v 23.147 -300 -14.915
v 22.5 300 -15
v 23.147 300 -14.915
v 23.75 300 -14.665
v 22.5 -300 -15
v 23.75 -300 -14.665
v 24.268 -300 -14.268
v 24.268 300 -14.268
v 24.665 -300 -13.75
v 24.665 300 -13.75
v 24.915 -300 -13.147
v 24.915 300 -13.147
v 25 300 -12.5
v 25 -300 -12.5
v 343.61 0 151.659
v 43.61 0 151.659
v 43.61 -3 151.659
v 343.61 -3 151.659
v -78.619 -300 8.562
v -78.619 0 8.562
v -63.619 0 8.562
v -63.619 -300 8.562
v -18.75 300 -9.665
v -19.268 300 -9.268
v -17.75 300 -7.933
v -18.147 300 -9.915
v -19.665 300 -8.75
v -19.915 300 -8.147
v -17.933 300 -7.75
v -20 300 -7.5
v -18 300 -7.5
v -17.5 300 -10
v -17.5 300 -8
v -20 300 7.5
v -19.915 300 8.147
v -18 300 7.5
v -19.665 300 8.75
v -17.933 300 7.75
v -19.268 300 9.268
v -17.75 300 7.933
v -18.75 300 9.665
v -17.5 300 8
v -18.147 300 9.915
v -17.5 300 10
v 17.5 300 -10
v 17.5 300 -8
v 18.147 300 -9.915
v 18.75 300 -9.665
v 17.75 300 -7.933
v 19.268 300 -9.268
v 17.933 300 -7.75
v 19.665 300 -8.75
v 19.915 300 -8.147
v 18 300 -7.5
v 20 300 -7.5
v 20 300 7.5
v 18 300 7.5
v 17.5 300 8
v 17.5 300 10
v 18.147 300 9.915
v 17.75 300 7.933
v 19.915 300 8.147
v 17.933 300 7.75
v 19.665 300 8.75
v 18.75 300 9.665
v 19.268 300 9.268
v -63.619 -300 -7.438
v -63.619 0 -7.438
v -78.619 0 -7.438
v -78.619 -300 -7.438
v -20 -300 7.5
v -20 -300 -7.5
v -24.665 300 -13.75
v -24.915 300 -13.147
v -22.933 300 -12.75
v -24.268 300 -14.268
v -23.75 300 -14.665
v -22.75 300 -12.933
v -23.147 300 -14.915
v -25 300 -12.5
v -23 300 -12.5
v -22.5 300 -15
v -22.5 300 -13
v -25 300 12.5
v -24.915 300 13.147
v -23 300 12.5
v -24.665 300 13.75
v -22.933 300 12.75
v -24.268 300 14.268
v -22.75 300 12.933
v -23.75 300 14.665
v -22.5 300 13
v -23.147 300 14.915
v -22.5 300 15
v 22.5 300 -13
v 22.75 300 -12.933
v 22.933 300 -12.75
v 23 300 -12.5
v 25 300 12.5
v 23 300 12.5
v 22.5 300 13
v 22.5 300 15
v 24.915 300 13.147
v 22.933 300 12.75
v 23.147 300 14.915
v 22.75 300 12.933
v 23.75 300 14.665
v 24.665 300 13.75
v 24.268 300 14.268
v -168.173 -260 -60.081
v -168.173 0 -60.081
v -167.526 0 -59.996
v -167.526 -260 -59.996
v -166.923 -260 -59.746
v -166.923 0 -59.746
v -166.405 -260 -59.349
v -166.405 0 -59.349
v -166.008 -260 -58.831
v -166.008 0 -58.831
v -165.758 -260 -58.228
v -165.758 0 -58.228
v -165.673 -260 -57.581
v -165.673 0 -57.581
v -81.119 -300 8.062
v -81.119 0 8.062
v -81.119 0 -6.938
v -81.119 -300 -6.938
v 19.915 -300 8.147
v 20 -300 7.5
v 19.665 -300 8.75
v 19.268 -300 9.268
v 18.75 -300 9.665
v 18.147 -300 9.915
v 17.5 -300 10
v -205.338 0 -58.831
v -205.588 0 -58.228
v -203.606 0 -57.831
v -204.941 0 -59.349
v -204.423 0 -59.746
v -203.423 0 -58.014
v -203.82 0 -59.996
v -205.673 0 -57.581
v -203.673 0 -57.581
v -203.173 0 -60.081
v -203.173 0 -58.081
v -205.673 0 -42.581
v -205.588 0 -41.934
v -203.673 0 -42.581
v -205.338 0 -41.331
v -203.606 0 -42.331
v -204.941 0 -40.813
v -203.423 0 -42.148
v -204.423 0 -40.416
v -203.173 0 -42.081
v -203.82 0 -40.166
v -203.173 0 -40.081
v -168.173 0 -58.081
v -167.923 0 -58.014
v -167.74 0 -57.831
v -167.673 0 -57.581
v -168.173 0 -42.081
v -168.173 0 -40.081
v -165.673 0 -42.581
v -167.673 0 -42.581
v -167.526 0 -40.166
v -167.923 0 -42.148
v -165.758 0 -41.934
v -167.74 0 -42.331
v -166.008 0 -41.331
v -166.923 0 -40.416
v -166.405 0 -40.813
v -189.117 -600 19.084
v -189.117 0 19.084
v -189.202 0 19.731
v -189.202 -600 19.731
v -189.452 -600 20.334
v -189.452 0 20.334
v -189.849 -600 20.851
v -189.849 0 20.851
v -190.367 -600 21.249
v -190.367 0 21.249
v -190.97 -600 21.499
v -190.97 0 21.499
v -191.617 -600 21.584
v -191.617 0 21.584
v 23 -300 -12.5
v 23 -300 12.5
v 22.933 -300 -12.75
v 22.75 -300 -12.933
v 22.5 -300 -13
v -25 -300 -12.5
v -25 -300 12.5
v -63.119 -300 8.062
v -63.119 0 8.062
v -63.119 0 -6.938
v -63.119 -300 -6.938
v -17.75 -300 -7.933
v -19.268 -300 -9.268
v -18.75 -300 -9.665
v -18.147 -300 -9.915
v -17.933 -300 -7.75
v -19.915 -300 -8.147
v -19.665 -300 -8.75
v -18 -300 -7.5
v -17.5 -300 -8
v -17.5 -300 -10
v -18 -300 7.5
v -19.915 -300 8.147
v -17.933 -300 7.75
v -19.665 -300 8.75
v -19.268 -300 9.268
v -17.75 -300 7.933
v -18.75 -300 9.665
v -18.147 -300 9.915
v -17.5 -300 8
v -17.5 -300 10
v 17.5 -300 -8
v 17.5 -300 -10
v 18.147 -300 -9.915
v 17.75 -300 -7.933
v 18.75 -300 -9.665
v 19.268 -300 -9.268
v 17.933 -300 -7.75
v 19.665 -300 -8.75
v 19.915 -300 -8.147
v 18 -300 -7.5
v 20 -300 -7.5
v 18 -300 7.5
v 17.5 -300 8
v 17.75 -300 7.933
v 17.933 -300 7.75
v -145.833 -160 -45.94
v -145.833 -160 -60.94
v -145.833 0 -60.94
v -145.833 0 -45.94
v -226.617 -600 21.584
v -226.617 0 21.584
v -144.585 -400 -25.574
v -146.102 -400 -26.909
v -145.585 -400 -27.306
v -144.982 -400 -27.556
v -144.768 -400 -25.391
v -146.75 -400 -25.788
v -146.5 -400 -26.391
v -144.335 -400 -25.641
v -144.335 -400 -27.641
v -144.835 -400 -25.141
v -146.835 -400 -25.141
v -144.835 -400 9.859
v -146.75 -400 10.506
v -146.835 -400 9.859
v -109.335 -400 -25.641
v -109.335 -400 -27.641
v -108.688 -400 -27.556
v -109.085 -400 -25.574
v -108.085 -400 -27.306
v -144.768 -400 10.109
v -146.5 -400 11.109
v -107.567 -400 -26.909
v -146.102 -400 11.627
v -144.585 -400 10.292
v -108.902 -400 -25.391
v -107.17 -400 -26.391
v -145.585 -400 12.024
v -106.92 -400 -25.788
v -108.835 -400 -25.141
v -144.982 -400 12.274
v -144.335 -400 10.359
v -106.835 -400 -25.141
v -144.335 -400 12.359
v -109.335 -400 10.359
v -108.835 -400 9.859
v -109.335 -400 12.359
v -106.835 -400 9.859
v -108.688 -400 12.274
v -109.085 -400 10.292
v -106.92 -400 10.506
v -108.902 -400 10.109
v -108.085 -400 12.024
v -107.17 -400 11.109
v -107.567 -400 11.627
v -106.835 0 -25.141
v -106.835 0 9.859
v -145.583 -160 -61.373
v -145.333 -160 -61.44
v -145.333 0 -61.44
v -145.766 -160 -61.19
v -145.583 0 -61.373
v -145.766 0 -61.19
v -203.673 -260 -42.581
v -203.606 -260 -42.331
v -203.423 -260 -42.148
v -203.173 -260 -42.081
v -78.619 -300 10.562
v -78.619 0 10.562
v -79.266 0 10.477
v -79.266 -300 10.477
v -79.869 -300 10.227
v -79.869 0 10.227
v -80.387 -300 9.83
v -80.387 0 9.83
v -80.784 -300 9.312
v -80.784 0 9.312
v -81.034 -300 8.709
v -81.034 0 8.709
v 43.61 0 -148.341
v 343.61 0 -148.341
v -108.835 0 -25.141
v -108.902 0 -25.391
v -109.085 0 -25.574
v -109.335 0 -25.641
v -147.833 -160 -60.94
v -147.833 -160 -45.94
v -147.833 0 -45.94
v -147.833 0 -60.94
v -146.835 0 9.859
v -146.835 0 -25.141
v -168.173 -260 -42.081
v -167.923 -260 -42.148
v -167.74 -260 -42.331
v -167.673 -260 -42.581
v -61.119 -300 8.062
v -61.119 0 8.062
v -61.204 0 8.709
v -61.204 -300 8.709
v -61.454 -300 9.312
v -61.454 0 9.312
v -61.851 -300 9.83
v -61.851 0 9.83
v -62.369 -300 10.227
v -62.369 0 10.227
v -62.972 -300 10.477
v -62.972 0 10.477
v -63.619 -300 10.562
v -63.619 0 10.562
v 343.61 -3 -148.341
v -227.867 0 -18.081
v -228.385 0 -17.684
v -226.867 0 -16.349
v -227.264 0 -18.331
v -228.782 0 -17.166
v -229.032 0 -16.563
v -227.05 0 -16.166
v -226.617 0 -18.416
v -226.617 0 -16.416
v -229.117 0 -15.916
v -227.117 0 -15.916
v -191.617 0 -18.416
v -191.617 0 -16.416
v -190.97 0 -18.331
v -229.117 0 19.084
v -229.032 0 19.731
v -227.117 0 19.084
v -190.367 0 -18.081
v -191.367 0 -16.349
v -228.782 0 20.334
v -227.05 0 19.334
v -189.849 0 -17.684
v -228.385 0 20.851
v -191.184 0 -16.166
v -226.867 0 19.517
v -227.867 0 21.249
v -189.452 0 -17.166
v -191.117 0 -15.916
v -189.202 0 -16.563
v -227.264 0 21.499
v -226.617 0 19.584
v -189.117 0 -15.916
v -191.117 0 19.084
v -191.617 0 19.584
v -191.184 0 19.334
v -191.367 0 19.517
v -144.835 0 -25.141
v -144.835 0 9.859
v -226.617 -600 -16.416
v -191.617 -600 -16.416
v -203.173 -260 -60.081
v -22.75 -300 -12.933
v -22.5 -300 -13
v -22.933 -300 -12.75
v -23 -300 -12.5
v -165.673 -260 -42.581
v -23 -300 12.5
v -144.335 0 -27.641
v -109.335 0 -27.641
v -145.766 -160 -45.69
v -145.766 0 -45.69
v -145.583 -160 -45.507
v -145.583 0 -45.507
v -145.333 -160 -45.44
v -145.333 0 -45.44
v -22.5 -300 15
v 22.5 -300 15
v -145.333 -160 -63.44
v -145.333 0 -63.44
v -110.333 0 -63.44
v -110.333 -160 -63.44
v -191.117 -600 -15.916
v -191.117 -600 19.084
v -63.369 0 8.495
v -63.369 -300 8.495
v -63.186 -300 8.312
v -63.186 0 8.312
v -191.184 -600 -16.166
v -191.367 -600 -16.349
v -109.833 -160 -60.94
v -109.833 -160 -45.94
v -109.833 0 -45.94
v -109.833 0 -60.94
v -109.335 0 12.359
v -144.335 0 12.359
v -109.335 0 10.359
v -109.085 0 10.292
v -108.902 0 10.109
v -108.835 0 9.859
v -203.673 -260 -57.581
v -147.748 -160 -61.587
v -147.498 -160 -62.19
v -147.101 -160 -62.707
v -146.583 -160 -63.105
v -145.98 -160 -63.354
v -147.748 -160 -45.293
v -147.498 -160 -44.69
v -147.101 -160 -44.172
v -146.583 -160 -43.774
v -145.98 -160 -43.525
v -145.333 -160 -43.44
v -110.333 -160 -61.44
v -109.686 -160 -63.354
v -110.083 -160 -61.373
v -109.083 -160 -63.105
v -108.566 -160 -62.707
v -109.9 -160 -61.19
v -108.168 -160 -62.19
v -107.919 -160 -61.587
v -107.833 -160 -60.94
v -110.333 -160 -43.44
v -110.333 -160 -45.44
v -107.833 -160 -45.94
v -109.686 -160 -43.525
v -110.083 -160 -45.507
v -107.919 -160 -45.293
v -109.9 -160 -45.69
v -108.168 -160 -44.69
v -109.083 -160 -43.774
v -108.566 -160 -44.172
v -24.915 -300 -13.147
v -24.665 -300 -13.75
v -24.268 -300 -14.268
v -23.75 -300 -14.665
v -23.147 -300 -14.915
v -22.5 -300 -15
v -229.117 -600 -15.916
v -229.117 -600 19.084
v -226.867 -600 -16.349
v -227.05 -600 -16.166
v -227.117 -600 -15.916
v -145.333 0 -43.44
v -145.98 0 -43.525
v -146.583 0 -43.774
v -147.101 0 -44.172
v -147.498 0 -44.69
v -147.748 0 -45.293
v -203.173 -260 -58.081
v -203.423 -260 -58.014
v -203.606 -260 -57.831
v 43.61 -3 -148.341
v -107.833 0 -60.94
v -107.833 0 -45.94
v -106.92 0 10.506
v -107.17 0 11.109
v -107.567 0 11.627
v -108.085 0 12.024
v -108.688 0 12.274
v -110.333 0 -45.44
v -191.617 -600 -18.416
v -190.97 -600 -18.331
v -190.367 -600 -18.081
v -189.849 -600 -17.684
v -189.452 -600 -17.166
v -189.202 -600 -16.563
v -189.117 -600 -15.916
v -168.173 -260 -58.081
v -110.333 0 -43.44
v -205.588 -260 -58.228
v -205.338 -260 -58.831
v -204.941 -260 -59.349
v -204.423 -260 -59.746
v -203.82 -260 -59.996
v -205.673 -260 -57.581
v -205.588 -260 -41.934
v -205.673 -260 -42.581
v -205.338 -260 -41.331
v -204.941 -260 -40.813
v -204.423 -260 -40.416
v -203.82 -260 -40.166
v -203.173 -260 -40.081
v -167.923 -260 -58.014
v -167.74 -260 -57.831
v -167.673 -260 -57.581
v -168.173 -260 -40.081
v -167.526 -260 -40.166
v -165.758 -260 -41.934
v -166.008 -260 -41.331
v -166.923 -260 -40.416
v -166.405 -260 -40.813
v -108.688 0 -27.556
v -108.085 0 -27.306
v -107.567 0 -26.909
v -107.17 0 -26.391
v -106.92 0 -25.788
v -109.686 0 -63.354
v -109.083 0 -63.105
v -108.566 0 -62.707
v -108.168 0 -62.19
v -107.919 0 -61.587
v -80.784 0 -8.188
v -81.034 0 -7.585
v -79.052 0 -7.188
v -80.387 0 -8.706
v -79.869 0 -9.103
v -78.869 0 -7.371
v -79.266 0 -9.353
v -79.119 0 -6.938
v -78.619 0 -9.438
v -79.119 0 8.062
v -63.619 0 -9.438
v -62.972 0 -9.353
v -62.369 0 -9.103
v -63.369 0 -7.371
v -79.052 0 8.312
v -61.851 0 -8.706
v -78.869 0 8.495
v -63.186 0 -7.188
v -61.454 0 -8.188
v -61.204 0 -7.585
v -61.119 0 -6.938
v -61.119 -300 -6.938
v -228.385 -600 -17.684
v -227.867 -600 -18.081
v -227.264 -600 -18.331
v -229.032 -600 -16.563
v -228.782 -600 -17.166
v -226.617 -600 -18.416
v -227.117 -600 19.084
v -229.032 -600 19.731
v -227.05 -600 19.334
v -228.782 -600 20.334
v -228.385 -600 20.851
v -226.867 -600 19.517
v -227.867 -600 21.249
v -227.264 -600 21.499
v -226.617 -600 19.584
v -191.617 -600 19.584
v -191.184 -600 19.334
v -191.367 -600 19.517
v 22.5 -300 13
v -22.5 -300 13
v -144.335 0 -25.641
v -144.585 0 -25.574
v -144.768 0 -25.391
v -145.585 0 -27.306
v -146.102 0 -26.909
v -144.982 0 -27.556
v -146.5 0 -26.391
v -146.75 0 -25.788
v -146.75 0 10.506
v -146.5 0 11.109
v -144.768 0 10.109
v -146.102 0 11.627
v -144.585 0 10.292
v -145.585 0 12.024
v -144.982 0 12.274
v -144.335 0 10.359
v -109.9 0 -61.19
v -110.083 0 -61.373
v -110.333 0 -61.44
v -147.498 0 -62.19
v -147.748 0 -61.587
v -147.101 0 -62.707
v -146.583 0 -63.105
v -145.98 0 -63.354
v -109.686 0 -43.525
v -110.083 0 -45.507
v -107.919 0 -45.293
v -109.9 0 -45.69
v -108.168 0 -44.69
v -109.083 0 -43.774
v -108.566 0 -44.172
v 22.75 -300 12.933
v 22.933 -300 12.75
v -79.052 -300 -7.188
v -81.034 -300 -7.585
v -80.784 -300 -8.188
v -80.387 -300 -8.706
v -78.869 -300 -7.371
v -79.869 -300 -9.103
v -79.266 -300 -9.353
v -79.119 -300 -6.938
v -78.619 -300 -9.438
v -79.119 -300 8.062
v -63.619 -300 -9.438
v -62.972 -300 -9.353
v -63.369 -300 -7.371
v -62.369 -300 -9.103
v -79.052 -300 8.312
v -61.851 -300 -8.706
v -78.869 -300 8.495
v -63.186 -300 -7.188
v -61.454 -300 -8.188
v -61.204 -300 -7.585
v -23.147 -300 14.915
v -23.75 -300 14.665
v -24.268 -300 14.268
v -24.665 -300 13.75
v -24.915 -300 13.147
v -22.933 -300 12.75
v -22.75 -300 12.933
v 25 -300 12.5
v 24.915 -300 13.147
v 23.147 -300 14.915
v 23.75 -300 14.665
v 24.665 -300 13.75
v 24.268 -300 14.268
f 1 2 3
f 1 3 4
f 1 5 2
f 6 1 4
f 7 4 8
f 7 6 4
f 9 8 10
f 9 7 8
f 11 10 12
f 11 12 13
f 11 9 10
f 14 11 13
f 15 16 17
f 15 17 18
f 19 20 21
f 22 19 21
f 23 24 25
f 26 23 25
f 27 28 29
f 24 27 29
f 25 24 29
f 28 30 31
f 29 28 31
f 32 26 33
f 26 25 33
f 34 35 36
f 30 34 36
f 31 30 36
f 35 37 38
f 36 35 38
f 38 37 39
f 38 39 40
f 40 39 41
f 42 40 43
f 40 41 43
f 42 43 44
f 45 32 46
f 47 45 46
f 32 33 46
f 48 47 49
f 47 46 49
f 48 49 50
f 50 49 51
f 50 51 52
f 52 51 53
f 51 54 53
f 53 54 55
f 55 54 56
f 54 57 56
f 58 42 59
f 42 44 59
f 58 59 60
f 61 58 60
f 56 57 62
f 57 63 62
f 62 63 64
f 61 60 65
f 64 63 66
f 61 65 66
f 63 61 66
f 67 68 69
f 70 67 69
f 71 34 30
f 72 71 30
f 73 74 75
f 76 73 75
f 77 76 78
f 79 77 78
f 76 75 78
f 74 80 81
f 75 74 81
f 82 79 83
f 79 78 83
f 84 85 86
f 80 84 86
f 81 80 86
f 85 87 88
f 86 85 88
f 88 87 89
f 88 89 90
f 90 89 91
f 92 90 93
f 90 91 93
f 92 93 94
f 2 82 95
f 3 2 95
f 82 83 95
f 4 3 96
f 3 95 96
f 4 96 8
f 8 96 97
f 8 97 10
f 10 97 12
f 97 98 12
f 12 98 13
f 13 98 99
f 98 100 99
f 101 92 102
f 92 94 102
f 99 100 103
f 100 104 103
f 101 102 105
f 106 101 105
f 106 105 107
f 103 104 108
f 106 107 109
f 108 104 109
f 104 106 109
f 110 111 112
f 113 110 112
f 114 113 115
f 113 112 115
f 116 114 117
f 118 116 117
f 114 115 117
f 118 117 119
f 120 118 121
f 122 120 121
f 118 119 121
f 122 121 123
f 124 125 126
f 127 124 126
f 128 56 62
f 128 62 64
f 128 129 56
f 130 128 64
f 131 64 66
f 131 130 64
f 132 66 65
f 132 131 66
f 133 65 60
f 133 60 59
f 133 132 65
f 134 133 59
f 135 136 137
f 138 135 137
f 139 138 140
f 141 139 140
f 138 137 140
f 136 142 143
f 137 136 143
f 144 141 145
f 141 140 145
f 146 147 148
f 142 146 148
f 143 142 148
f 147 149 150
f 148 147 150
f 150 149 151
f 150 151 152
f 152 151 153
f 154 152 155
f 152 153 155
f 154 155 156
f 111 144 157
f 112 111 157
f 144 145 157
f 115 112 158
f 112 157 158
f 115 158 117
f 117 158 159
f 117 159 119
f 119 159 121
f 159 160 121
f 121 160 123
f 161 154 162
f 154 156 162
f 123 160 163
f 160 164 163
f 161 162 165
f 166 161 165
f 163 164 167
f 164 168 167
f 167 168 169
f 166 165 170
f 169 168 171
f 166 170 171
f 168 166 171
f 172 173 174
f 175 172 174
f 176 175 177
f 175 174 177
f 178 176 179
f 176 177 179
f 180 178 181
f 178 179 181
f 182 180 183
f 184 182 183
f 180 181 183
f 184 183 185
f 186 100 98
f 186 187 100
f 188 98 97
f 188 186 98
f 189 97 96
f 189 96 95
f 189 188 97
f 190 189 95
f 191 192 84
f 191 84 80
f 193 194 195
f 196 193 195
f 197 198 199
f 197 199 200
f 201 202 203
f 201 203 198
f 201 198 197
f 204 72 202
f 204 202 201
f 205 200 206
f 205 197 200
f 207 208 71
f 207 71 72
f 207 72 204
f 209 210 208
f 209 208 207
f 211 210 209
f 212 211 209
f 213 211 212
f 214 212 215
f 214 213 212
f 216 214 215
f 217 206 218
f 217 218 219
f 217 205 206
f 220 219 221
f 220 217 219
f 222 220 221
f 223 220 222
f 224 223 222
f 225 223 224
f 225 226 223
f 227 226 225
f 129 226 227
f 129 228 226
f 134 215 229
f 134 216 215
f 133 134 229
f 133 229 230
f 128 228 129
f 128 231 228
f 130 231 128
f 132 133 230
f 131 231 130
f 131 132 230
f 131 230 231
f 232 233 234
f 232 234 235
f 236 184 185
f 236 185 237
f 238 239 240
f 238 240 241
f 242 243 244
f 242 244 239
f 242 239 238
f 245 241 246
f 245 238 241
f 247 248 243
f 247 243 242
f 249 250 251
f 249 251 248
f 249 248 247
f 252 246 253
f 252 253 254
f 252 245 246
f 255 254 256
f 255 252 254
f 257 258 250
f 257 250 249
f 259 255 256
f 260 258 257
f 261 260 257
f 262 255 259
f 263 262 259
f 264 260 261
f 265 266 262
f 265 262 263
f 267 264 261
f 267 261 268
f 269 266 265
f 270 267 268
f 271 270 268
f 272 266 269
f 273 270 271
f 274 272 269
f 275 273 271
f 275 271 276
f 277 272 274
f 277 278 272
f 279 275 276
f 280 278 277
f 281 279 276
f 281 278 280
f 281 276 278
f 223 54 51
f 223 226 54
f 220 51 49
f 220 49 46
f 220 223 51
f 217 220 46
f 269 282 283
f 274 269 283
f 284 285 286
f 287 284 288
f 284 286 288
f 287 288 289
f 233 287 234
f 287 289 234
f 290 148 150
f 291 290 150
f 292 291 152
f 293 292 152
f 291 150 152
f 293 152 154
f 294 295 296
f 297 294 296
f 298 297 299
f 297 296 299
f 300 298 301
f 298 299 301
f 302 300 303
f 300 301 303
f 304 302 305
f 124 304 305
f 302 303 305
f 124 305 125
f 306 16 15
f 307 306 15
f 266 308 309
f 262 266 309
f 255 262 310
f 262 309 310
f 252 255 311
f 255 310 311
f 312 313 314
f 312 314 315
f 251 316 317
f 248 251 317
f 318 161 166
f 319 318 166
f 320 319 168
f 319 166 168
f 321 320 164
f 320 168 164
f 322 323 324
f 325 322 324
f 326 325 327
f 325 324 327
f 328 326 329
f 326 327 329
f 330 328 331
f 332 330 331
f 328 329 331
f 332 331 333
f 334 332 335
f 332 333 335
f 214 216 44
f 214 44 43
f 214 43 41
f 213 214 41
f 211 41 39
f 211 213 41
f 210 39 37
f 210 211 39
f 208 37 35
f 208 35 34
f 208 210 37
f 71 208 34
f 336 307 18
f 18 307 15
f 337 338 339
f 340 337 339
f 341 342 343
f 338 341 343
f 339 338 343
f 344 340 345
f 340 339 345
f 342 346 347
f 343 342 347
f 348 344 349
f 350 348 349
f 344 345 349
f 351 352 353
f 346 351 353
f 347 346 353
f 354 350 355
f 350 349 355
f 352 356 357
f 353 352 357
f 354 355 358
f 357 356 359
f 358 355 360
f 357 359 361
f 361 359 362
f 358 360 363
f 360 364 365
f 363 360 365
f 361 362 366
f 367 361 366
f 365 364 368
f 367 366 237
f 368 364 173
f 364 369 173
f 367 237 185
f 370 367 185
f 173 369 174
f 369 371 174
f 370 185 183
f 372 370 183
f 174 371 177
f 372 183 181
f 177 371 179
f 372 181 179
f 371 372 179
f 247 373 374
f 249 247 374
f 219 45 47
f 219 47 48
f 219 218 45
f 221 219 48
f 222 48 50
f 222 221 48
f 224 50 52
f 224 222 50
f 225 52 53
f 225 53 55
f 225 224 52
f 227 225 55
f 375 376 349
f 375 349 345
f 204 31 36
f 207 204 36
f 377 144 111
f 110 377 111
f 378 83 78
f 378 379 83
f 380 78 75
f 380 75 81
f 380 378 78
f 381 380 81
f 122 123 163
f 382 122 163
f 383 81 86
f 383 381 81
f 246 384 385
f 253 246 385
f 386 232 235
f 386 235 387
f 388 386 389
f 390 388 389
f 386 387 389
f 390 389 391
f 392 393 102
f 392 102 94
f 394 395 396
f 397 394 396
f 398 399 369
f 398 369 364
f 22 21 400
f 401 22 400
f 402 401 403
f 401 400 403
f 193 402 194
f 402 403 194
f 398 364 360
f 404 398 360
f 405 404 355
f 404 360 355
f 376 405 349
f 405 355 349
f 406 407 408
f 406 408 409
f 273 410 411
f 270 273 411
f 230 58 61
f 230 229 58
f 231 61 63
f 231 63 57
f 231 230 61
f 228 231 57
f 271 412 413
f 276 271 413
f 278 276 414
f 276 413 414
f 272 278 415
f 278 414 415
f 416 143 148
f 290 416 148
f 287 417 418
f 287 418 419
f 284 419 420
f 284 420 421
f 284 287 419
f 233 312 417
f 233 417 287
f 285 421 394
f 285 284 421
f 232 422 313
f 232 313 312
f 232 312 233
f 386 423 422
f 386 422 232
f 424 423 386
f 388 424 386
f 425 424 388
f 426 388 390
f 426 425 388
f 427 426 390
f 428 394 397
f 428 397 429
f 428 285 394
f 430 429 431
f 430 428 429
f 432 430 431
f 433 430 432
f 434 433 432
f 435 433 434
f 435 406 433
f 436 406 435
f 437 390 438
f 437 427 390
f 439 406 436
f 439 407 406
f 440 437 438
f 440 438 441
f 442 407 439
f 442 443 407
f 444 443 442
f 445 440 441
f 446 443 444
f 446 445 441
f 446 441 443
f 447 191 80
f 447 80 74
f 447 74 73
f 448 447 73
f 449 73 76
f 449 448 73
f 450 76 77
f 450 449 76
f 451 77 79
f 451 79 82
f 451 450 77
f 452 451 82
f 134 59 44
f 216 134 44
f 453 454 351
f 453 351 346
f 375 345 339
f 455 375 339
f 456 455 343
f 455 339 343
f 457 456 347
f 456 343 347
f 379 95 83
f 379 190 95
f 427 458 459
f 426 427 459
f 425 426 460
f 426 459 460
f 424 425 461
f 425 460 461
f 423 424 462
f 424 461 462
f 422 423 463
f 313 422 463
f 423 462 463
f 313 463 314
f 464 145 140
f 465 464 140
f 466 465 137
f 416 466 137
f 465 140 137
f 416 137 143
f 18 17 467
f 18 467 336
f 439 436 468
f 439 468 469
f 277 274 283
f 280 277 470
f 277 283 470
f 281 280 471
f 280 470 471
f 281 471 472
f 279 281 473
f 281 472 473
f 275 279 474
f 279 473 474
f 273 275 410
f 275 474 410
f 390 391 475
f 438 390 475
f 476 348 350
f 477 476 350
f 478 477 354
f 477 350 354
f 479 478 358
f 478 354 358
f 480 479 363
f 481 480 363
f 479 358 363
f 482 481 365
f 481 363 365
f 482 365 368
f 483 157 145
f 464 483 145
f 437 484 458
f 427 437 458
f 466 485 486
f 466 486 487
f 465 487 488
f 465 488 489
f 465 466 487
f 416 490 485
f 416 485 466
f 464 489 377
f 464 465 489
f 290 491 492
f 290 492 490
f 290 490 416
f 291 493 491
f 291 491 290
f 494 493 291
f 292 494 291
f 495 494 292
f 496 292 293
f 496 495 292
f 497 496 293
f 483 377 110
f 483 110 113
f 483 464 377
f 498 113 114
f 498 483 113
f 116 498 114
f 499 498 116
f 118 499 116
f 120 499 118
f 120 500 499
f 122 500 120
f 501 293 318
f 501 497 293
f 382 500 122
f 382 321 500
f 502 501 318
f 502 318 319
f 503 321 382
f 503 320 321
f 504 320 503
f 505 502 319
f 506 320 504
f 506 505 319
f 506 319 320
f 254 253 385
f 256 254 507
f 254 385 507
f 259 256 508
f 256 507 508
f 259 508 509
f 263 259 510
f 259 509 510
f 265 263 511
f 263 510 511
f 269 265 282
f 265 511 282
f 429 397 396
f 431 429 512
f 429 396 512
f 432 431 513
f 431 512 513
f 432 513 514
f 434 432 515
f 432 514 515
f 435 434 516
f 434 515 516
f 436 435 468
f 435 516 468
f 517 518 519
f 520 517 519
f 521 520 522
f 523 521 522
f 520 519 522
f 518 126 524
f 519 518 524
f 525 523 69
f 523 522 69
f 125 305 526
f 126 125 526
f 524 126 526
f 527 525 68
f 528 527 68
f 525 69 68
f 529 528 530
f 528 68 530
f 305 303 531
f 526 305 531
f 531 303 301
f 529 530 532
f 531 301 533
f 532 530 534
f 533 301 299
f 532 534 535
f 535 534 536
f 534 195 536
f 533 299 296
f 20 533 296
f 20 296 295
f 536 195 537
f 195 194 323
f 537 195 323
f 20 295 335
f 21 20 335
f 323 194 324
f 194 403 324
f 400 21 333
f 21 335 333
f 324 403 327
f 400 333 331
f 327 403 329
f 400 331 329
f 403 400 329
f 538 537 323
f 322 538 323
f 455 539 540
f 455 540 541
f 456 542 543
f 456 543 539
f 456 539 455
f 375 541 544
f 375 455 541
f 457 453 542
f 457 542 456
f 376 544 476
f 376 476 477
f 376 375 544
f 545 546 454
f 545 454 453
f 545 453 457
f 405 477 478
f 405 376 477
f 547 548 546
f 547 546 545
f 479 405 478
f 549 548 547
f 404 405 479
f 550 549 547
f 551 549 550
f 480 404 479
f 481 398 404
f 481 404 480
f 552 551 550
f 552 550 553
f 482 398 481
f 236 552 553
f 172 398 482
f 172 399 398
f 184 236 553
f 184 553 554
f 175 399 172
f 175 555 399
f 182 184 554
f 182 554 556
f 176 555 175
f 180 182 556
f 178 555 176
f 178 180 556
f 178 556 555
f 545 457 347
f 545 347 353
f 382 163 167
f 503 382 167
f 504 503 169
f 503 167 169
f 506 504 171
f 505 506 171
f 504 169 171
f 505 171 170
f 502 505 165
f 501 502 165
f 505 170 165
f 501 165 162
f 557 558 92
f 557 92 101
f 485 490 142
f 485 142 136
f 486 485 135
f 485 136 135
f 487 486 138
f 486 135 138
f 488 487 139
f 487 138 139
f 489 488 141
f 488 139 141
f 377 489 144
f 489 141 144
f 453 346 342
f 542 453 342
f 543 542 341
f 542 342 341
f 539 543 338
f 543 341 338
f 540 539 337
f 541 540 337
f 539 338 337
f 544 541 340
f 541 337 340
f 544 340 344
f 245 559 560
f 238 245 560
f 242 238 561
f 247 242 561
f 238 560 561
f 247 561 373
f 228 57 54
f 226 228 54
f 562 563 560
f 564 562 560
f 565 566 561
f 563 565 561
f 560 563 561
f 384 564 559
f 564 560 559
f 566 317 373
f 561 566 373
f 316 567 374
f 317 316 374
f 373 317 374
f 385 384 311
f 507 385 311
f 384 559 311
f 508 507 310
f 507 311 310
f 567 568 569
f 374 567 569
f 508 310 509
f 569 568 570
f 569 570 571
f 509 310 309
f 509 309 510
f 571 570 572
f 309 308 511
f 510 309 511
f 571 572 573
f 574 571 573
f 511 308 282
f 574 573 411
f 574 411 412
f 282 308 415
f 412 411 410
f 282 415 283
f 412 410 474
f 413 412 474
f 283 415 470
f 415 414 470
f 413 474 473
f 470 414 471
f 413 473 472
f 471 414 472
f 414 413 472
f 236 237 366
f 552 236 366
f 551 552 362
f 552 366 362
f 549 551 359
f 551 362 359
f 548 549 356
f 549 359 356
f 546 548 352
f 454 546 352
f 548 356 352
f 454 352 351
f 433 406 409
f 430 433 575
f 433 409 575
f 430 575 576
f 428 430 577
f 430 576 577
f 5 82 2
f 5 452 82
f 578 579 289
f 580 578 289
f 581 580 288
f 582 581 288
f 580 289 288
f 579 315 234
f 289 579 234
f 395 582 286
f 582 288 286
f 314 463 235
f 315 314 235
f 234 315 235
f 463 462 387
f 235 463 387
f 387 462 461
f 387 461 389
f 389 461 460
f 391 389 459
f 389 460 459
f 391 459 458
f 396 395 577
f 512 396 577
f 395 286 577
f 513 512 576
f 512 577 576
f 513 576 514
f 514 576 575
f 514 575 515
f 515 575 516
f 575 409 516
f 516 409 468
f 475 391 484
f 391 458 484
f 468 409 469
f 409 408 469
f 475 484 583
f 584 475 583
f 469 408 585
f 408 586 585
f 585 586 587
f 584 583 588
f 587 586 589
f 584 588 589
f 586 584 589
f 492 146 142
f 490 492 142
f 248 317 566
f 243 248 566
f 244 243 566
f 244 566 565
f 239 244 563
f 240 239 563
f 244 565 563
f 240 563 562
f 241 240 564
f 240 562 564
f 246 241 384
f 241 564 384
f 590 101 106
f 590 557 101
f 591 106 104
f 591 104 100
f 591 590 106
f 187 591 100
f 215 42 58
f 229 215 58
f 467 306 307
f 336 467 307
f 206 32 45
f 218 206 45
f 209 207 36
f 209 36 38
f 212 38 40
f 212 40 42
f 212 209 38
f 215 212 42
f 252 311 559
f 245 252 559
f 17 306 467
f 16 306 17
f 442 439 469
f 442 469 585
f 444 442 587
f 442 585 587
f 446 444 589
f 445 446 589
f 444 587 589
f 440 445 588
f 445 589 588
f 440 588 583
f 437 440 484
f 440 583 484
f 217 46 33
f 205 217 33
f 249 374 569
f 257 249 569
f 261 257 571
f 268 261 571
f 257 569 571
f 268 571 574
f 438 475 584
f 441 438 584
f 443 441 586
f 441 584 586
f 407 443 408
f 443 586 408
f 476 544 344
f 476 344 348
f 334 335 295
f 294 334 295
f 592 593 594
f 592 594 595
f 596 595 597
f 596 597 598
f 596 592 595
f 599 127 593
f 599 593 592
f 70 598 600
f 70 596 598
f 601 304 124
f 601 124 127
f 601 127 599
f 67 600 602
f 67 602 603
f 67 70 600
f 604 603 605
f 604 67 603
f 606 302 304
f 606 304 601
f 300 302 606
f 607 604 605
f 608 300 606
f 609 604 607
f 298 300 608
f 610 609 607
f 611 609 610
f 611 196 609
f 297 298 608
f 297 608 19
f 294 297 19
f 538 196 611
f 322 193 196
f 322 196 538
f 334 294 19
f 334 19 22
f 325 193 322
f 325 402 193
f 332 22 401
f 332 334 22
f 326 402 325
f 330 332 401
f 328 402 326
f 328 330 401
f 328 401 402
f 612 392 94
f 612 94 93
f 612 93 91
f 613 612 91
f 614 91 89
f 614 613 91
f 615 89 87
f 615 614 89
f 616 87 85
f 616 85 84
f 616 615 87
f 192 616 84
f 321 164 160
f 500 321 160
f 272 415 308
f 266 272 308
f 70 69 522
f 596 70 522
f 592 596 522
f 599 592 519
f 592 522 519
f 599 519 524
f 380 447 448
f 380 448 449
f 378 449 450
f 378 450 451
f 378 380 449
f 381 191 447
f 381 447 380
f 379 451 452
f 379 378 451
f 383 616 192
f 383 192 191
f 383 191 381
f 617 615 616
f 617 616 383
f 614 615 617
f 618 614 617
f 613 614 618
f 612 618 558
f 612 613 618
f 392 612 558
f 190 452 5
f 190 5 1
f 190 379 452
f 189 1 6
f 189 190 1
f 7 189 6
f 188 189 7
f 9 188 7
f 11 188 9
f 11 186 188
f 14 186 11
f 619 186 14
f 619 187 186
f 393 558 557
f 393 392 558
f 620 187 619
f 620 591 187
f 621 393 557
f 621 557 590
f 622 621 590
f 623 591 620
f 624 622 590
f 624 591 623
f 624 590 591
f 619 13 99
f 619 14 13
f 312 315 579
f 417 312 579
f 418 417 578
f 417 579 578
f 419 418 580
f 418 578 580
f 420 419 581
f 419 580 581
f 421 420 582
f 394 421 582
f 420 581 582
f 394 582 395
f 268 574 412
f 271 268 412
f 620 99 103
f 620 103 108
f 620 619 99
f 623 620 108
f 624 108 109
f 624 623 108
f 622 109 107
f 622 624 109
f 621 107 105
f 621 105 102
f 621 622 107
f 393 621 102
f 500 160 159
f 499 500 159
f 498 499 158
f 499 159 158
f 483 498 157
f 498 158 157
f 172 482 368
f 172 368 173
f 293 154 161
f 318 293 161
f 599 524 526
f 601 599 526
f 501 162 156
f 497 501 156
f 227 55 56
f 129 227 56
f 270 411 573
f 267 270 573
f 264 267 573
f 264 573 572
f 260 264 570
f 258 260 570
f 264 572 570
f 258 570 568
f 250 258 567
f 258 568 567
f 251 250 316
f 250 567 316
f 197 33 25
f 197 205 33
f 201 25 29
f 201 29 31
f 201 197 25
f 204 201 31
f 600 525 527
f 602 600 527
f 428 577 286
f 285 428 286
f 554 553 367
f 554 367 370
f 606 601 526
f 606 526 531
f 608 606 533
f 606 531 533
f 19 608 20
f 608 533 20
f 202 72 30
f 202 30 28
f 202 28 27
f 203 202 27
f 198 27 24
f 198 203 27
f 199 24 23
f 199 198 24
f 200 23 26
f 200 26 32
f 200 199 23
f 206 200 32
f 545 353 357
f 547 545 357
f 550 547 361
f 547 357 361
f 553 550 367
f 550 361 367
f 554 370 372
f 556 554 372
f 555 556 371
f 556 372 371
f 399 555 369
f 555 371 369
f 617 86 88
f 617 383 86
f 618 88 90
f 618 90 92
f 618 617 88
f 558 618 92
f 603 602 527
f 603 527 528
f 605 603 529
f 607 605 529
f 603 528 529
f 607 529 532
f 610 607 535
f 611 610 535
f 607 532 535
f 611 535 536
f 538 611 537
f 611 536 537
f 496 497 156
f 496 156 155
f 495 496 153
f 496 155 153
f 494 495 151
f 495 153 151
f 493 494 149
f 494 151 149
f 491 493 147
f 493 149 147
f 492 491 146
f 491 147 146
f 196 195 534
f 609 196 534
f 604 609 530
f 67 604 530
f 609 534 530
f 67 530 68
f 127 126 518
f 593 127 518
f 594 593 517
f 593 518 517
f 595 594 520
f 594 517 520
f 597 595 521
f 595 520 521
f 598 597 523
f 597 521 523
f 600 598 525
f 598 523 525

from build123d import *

# Parameters (mm, degrees)
F1_DEPTH  = 300
F3_DEPTH  = 300
F6_DEPTH  = 300
F8_DEPTH  = 160
F9_W      = 300
F9_H      = 300
F10_DEPTH = 3
F12_DEPTH = 260
F14_DEPTH = 600
F15_DEPTH = 400


with BuildPart() as f1:
    # F0 (on Front) → F1 (new body, symmetric)
    with BuildSketch(Plane.XZ):
        with BuildLine():
            ThreePointArc((25, 12.5), (24.267767, 14.267767), (22.5, 15))
            Line((22.5, 15), (-22.5, 15))
            ThreePointArc((-22.5, 15), (-24.267767, 14.267767), (-25, 12.5))
            Line((-25, 12.5), (-25, -12.5))
            ThreePointArc((-25, -12.5), (-24.267767, -14.267767), (-22.5, -15))
            Line((-22.5, -15), (22.5, -15))
            ThreePointArc((22.5, -15), (24.267767, -14.267767), (25, -12.5))
            Line((25, -12.5), (25, 12.5))
        make_face()
        with BuildLine():
            Line((-22.5, 13), (22.5, 13))
            ThreePointArc((22.5, 13), (22.853553, 12.853553), (23, 12.5))
            Line((23, 12.5), (23, -12.5))
            ThreePointArc((23, -12.5), (22.853553, -12.853553), (22.5, -13))
            Line((22.5, -13), (-22.5, -13))
            ThreePointArc((-22.5, -13), (-22.853553, -12.853553), (-23, -12.5))
            Line((-23, -12.5), (-23, 12.5))
            ThreePointArc((-23, 12.5), (-22.853553, 12.853553), (-22.5, 13))
        make_face(mode=Mode.SUBTRACT)
    extrude(amount=F1_DEPTH, both=True)


with BuildPart() as f3:
    # F2 (on Front) → F3 (new body, symmetric)
    with BuildSketch(Plane.XZ):
        with BuildLine():
            Line((17.5, 10), (-17.5, 10))
            ThreePointArc((-17.5, 10), (-19.267767, 9.267767), (-20, 7.5))
            Line((-20, 7.5), (-20, -7.5))
            ThreePointArc((-20, -7.5), (-19.267767, -9.267767), (-17.5, -10))
            Line((-17.5, -10), (17.5, -10))
            ThreePointArc((17.5, -10), (19.267767, -9.267767), (20, -7.5))
            Line((20, -7.5), (20, 7.5))
            ThreePointArc((20, 7.5), (19.267767, 9.267767), (17.5, 10))
        make_face()
        with BuildLine():
            ThreePointArc((-18, 7.5), (-17.853553, 7.853553), (-17.5, 8))
            Line((-17.5, 8), (17.5, 8))
            ThreePointArc((17.5, 8), (17.853553, 7.853553), (18, 7.5))
            Line((18, 7.5), (18, -7.5))
            ThreePointArc((18, -7.5), (17.853553, -7.853553), (17.5, -8))
            Line((17.5, -8), (-17.5, -8))
            ThreePointArc((-17.5, -8), (-17.853553, -7.853553), (-18, -7.5))
            Line((-18, -7.5), (-18, 7.5))
        make_face(mode=Mode.SUBTRACT)
    extrude(amount=F3_DEPTH, both=True)


with BuildPart() as f6:
    # F5 (on Front) → F6 (new body)
    with BuildSketch(Plane.XZ):
        with BuildLine():
            Line((-63.618955, 10.562212), (-78.618955, 10.562212))
            ThreePointArc((-78.618955, 10.562212), (-80.386722, 9.829979), (-81.118955, 8.062212))
            Line((-81.118955, 8.062212), (-81.118955, -6.937788))
            ThreePointArc((-81.118955, -6.937788), (-80.386722, -8.705555), (-78.618955, -9.437788))
            Line((-78.618955, -9.437788), (-63.618955, -9.437788))
            ThreePointArc((-63.618955, -9.437788), (-61.851188, -8.705555), (-61.118955, -6.937788))
            Line((-61.118955, -6.937788), (-61.118955, 8.062212))
            ThreePointArc((-61.118955, 8.062212), (-61.851188, 9.829979), (-63.618955, 10.562212))
        make_face()
        with BuildLine():
            ThreePointArc((-79.118955, 8.062212), (-78.972508, 8.415765), (-78.618955, 8.562212))
            Line((-78.618955, 8.562212), (-63.618955, 8.562212))
            ThreePointArc((-63.618955, 8.562212), (-63.265401, 8.415765), (-63.118955, 8.062212))
            Line((-63.118955, 8.062212), (-63.118955, -6.937788))
            ThreePointArc((-63.118955, -6.937788), (-63.265401, -7.291342), (-63.618955, -7.437788))
            Line((-63.618955, -7.437788), (-78.618955, -7.437788))
            ThreePointArc((-78.618955, -7.437788), (-78.972508, -7.291342), (-79.118955, -6.937788))
            Line((-79.118955, -6.937788), (-79.118955, 8.062212))
        make_face(mode=Mode.SUBTRACT)
    extrude(amount=F6_DEPTH)


with BuildPart() as f8:
    # F7 (on Front) → F8 (new body)
    with BuildSketch(Plane.XZ):
        with BuildLine():
            Line((-110.333331, -43.439553), (-145.333331, -43.439553))
            ThreePointArc((-145.333331, -43.439553), (-147.101098, -44.171786), (-147.833331, -45.939553))
            Line((-147.833331, -45.939553), (-147.833331, -60.939553))
            ThreePointArc((-147.833331, -60.939553), (-147.101098, -62.70732), (-145.333331, -63.439553))
            Line((-145.333331, -63.439553), (-110.333331, -63.439553))
            ThreePointArc((-110.333331, -63.439553), (-108.565564, -62.70732), (-107.833331, -60.939553))
            Line((-107.833331, -60.939553), (-107.833331, -45.939553))
            ThreePointArc((-107.833331, -45.939553), (-108.565564, -44.171786), (-110.333331, -43.439553))
        make_face()
        with BuildLine():
            ThreePointArc((-145.833331, -45.939553), (-145.686884, -45.586), (-145.333331, -45.439553))
            Line((-145.333331, -45.439553), (-110.333331, -45.439553))
            ThreePointArc((-110.333331, -45.439553), (-109.979778, -45.586), (-109.833331, -45.939553))
            Line((-109.833331, -45.939553), (-109.833331, -60.939553))
            ThreePointArc((-109.833331, -60.939553), (-109.979778, -61.293106), (-110.333331, -61.439553))
            Line((-110.333331, -61.439553), (-145.333331, -61.439553))
            ThreePointArc((-145.333331, -61.439553), (-145.686884, -61.293106), (-145.833331, -60.939553))
            Line((-145.833331, -60.939553), (-145.833331, -45.939553))
        make_face(mode=Mode.SUBTRACT)
    extrude(amount=F8_DEPTH)


with BuildPart() as f10:
    # F9 (on Front) → F10 (new body)
    with BuildSketch(Plane.XZ):
        with Locations((193.61024, 1.659309)):
            Rectangle(F9_W, F9_H)
    extrude(amount=F10_DEPTH)


with BuildPart() as f12:
    # F11 (on Front) → F12 (new body)
    with BuildSketch(Plane.XZ):
        with BuildLine():
            Line((-168.173266, -40.080923), (-203.173266, -40.080923))
            ThreePointArc((-203.173266, -40.080923), (-204.941033, -40.813156), (-205.673266, -42.580923))
            Line((-205.673266, -42.580923), (-205.673266, -57.580923))
            ThreePointArc((-205.673266, -57.580923), (-204.941033, -59.34869), (-203.173266, -60.080923))
            Line((-203.173266, -60.080923), (-168.173266, -60.080923))
            ThreePointArc((-168.173266, -60.080923), (-166.405499, -59.34869), (-165.673266, -57.580923))
            Line((-165.673266, -57.580923), (-165.673266, -42.580923))
            ThreePointArc((-165.673266, -42.580923), (-166.405499, -40.813156), (-168.173266, -40.080923))
        make_face()
        with BuildLine():
            ThreePointArc((-203.673266, -42.580923), (-203.526819, -42.22737), (-203.173266, -42.080923))
            Line((-203.173266, -42.080923), (-168.173266, -42.080923))
            ThreePointArc((-168.173266, -42.080923), (-167.819712, -42.22737), (-167.673266, -42.580923))
            Line((-167.673266, -42.580923), (-167.673266, -57.580923))
            ThreePointArc((-167.673266, -57.580923), (-167.819712, -57.934476), (-168.173266, -58.080923))
            Line((-168.173266, -58.080923), (-203.173266, -58.080923))
            ThreePointArc((-203.173266, -58.080923), (-203.526819, -57.934476), (-203.673266, -57.580923))
            Line((-203.673266, -57.580923), (-203.673266, -42.580923))
        make_face(mode=Mode.SUBTRACT)
    extrude(amount=F12_DEPTH)


with BuildPart() as f14:
    # F13 (on Front) → F14 (new body)
    with BuildSketch(Plane.XZ):
        with BuildLine():
            Line((-191.616746, 21.583727), (-226.616746, 21.583727))
            ThreePointArc((-226.616746, 21.583727), (-228.384513, 20.851494), (-229.116746, 19.083727))
            Line((-229.116746, 19.083727), (-229.116746, -15.916273))
            ThreePointArc((-229.116746, -15.916273), (-228.384513, -17.68404), (-226.616746, -18.416273))
            Line((-226.616746, -18.416273), (-191.616746, -18.416273))
            ThreePointArc((-191.616746, -18.416273), (-189.848979, -17.68404), (-189.116746, -15.916273))
            Line((-189.116746, -15.916273), (-189.116746, 19.083727))
            ThreePointArc((-189.116746, 19.083727), (-189.848979, 20.851494), (-191.616746, 21.583727))
        make_face()
        with BuildLine():
            ThreePointArc((-227.116746, 19.083727), (-226.9703, 19.43728), (-226.616746, 19.583727))
            Line((-226.616746, 19.583727), (-191.616746, 19.583727))
            ThreePointArc((-191.616746, 19.583727), (-191.263193, 19.43728), (-191.116746, 19.083727))
            Line((-191.116746, 19.083727), (-191.116746, -15.916273))
            ThreePointArc((-191.116746, -15.916273), (-191.263193, -16.269827), (-191.616746, -16.416273))
            Line((-191.616746, -16.416273), (-226.616746, -16.416273))
            ThreePointArc((-226.616746, -16.416273), (-226.9703, -16.269827), (-227.116746, -15.916273))
            Line((-227.116746, -15.916273), (-227.116746, 19.083727))
        make_face(mode=Mode.SUBTRACT)
    extrude(amount=F14_DEPTH)


with BuildPart() as f15:
    # F4 (on Front) → F15 (new body)
    with BuildSketch(Plane.XZ):
        with BuildLine():
            Line((-109.334691, 12.358871), (-144.334691, 12.358871))
            ThreePointArc((-144.334691, 12.358871), (-146.102458, 11.626638), (-146.834691, 9.858871))
            Line((-146.834691, 9.858871), (-146.834691, -25.141129))
            ThreePointArc((-146.834691, -25.141129), (-146.102458, -26.908896), (-144.334691, -27.641129))
            Line((-144.334691, -27.641129), (-109.334691, -27.641129))
            ThreePointArc((-109.334691, -27.641129), (-107.566924, -26.908896), (-106.834691, -25.141129))
            Line((-106.834691, -25.141129), (-106.834691, 9.858871))
            ThreePointArc((-106.834691, 9.858871), (-107.566924, 11.626638), (-109.334691, 12.358871))
        make_face()
        with BuildLine():
            ThreePointArc((-144.834691, 9.858871), (-144.688244, 10.212424), (-144.334691, 10.358871))
            Line((-144.334691, 10.358871), (-109.334691, 10.358871))
            ThreePointArc((-109.334691, 10.358871), (-108.981137, 10.212424), (-108.834691, 9.858871))
            Line((-108.834691, 9.858871), (-108.834691, -25.141129))
            ThreePointArc((-108.834691, -25.141129), (-108.981137, -25.494682), (-109.334691, -25.641129))
            Line((-109.334691, -25.641129), (-144.334691, -25.641129))
            ThreePointArc((-144.334691, -25.641129), (-144.688244, -25.494682), (-144.834691, -25.141129))
            Line((-144.834691, -25.141129), (-144.834691, 9.858871))
        make_face(mode=Mode.SUBTRACT)
    extrude(amount=F15_DEPTH)


solid = Compound([f1.part, f3.part, f6.part, f8.part, f10.part, f12.part, f14.part, f15.part])
